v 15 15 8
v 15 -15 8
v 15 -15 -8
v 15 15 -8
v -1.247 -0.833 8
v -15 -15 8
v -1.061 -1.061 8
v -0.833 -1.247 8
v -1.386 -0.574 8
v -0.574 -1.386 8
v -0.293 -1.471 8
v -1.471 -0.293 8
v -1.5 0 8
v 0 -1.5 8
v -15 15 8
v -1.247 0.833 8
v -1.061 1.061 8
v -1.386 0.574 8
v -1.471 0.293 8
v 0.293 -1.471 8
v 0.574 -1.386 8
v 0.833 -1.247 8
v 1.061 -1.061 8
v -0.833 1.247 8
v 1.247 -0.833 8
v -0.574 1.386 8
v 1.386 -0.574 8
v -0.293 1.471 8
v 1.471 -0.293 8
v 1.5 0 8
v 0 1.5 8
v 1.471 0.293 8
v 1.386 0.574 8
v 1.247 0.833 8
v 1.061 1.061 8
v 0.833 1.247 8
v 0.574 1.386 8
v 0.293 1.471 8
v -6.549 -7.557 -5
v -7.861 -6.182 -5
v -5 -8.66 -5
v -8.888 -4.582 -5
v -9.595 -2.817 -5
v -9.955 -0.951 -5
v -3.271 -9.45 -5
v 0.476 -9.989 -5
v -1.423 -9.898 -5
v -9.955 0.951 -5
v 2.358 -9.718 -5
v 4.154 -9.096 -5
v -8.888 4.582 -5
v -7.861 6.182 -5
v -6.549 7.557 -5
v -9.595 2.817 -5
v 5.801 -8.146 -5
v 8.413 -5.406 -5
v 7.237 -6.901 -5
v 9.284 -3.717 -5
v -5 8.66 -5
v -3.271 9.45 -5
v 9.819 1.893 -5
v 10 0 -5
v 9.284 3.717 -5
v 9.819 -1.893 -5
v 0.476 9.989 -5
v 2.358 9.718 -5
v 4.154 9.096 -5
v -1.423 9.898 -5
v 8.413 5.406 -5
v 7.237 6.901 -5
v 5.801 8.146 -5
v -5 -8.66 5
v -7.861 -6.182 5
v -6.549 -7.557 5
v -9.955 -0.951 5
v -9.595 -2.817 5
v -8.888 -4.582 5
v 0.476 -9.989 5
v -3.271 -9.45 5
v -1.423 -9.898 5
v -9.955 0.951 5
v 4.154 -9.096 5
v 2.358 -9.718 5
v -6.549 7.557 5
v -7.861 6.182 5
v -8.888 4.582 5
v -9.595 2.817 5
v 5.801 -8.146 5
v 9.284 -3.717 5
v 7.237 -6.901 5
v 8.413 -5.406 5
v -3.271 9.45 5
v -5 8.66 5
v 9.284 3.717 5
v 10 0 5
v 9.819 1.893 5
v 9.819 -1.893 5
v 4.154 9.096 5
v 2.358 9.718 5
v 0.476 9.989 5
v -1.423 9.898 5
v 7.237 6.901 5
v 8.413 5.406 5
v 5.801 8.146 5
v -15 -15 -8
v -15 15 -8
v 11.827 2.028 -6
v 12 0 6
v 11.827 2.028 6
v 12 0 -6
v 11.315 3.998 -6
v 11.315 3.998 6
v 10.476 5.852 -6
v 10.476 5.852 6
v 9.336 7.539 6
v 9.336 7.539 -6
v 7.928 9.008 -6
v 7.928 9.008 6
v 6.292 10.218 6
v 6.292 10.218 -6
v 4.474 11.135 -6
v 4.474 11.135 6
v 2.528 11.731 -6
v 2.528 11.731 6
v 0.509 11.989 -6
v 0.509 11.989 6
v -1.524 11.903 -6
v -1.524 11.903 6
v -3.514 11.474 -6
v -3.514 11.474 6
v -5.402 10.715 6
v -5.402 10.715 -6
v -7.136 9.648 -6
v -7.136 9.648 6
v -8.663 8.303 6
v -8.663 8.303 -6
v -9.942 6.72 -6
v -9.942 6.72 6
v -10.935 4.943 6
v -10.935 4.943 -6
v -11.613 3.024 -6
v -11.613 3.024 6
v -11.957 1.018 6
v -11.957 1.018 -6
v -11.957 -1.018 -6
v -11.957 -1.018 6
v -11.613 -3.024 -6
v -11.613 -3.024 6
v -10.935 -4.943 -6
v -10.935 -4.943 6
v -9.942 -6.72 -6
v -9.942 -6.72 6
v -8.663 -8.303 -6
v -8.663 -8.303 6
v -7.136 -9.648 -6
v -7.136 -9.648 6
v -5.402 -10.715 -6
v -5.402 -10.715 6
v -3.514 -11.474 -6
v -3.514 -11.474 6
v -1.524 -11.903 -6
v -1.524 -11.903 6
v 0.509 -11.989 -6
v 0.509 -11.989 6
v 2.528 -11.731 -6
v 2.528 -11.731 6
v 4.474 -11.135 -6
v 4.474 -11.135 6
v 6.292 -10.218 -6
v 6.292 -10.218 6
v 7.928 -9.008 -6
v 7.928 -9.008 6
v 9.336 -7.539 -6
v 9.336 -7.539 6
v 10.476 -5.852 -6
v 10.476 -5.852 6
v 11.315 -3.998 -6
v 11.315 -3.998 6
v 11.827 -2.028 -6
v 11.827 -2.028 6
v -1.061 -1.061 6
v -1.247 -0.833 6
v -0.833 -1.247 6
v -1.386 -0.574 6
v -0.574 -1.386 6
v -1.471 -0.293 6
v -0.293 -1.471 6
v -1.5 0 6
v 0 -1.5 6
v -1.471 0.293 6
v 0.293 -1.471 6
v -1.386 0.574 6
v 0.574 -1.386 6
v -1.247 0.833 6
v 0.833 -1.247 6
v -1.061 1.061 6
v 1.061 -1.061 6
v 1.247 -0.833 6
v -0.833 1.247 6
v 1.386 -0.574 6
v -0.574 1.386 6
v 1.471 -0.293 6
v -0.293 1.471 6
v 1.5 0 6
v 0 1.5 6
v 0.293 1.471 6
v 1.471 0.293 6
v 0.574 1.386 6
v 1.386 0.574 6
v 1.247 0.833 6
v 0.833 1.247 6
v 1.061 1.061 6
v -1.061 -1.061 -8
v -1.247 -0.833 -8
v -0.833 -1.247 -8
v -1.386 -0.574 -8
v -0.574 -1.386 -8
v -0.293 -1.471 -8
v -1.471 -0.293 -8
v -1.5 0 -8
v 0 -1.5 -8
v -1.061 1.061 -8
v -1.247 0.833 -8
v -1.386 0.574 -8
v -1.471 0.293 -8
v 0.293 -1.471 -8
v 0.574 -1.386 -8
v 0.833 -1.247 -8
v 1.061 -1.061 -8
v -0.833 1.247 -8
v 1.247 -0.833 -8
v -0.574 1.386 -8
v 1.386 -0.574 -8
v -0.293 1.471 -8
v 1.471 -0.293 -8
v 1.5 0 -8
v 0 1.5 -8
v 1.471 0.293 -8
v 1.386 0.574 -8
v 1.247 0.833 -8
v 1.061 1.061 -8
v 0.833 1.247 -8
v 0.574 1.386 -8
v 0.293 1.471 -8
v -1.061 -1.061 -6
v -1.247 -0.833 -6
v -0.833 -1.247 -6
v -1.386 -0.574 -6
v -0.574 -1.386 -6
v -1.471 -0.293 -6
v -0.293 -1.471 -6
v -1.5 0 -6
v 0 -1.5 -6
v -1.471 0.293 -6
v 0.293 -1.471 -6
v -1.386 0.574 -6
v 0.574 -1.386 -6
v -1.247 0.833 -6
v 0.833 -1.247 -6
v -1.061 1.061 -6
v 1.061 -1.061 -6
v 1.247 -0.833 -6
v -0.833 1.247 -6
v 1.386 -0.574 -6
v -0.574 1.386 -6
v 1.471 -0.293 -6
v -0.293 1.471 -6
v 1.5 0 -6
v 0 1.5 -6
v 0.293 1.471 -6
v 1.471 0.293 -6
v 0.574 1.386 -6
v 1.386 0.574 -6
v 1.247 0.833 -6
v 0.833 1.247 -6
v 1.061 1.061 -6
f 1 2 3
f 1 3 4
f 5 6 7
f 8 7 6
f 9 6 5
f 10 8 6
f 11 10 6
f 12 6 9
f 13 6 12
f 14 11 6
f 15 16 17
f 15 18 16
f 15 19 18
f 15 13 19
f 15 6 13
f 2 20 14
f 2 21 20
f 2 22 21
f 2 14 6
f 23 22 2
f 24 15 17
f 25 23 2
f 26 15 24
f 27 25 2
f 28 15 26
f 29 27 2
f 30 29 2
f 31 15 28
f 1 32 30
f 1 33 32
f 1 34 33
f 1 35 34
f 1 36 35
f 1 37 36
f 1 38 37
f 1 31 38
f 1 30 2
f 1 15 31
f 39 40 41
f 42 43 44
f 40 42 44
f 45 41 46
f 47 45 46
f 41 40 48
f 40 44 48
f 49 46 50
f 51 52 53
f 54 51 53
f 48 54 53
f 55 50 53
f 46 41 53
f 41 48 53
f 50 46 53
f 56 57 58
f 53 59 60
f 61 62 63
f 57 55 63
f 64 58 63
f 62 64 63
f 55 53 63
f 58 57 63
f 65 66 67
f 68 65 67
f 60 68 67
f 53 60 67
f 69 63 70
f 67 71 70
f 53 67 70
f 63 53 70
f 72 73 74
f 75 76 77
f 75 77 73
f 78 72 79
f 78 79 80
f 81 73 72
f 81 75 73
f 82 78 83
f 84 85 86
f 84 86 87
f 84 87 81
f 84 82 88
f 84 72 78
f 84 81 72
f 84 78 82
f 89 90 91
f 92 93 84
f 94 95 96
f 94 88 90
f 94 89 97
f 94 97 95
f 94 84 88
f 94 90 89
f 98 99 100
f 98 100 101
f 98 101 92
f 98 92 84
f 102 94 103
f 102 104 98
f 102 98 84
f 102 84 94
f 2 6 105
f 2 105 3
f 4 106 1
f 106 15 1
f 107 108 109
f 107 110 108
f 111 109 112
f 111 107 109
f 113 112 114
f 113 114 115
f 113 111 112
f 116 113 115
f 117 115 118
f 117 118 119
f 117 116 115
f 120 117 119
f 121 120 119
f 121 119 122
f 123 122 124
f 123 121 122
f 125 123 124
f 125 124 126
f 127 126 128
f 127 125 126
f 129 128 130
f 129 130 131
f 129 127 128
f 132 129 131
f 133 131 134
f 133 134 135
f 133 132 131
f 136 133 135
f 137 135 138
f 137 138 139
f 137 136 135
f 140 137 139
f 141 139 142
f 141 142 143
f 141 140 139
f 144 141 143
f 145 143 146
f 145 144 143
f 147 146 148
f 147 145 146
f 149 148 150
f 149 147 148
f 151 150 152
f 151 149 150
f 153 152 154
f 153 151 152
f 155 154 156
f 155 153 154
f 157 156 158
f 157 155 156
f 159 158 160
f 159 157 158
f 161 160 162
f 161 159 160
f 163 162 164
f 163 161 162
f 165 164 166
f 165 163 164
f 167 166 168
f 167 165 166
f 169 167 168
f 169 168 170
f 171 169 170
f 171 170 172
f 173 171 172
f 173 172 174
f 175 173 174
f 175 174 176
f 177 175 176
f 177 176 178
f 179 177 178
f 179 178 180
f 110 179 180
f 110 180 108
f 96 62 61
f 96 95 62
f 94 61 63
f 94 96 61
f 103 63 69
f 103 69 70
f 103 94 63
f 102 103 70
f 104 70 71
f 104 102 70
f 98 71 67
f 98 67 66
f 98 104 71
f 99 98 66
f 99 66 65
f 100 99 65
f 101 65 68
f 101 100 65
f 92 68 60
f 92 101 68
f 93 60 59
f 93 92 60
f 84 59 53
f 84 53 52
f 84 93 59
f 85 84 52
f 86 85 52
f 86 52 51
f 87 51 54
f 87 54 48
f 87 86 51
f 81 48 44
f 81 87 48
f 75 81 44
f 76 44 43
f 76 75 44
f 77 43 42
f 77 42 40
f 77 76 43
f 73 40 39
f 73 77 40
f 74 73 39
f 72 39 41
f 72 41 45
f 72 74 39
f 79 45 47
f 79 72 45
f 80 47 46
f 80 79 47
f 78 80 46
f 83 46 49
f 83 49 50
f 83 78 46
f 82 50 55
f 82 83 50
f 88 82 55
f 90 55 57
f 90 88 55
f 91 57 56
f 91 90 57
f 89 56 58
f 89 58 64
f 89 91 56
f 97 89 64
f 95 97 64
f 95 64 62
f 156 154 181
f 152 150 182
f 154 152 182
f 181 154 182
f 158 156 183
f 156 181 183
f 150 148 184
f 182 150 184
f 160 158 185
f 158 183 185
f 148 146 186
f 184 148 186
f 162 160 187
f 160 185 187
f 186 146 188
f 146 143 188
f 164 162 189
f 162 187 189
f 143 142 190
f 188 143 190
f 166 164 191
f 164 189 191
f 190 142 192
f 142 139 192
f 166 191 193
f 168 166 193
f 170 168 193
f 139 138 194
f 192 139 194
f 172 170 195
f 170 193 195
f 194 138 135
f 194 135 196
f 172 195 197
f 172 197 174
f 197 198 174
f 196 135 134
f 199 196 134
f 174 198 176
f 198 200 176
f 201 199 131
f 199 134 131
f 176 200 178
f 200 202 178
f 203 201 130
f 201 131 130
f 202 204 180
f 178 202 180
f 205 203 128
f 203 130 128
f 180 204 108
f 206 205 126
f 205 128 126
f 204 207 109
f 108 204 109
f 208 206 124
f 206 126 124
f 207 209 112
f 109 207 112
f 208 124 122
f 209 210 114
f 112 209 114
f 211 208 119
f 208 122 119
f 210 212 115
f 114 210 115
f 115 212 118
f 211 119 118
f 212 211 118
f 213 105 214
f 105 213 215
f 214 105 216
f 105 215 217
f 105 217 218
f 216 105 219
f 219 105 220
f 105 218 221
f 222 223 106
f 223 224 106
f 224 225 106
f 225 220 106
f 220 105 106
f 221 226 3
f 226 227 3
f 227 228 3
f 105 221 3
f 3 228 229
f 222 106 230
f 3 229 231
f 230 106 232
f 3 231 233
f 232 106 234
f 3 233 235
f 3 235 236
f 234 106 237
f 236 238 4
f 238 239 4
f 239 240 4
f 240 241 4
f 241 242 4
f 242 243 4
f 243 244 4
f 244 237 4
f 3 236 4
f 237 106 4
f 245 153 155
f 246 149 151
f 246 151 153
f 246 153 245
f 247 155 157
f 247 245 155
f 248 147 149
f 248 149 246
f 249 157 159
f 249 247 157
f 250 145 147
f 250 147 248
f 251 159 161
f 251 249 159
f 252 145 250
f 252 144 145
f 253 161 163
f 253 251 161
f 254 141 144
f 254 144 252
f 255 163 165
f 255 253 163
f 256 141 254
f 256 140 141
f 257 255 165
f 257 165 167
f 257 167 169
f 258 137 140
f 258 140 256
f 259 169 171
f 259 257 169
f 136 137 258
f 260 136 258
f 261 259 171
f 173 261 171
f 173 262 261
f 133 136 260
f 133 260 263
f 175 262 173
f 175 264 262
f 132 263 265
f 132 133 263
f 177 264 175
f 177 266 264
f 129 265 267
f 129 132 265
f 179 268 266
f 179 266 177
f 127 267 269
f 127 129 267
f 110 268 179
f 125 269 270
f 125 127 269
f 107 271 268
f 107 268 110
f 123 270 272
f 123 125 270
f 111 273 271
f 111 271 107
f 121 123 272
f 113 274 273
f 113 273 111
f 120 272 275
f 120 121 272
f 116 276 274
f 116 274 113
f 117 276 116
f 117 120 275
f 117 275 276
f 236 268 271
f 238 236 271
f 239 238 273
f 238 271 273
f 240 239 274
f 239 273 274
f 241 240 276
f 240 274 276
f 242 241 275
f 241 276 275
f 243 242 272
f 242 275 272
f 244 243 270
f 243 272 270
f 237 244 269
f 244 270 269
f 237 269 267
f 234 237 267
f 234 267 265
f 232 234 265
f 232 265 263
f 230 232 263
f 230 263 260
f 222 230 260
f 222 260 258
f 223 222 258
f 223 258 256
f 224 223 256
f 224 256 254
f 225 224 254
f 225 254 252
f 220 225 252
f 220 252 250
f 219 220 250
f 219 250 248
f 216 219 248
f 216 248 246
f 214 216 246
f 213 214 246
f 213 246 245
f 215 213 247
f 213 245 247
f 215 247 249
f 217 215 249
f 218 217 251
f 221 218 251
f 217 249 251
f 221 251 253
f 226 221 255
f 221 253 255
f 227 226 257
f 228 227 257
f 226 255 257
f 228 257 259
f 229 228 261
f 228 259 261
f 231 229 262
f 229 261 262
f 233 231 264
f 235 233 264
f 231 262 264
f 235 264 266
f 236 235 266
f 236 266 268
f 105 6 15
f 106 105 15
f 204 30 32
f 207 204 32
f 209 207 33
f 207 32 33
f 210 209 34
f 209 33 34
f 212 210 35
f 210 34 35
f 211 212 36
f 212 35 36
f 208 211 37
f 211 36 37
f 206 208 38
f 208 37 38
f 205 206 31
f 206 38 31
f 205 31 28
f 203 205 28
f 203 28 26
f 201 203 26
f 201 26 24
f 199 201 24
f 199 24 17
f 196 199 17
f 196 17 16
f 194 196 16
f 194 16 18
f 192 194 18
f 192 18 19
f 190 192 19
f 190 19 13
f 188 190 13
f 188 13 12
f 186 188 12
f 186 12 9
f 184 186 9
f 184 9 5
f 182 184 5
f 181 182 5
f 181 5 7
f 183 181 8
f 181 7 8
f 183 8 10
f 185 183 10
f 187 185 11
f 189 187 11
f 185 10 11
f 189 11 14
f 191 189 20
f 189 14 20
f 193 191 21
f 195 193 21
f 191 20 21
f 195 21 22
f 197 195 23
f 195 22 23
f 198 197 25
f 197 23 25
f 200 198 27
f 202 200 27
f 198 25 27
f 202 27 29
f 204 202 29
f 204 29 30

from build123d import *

# Parameters (mm, degrees)
SKETCH1_R           = 10
BOSS_EXTRUDE1_DEPTH = 5
SKETCH2_W           = 30
SKETCH2_H           = 30
SKETCH2_R           = 12
BOSS_EXTRUDE2_DEPTH = 6
SKETCH3_W           = 30
SKETCH3_H           = 30
BOSS_EXTRUDE3_DEPTH = 2
SKETCH4_R           = 1.5
CUT_EXTRUDE1_DEPTH  = 27.570660511


with BuildPart() as part:
    # Sketch1 → Boss-Extrude1 (new, symmetric)
    with BuildSketch(Plane.XY):
        Circle(SKETCH1_R)
    extrude(amount=BOSS_EXTRUDE1_DEPTH, both=True)


with BuildPart() as body_2:
    # Sketch2 → Boss-Extrude2 (new, symmetric)
    with BuildSketch(Plane.XY):
        Rectangle(SKETCH2_W, SKETCH2_H)
        Circle(SKETCH2_R, mode=Mode.SUBTRACT)
    extrude(amount=BOSS_EXTRUDE2_DEPTH, both=True)

    # Sketch3 → Boss-Extrude3 (add)
    with BuildSketch(Plane.XY.offset(6)):
        Rectangle(SKETCH3_W, SKETCH3_H)
    boss_extrude3 = extrude(amount=BOSS_EXTRUDE3_DEPTH)

    # Mirror1: Boss-Extrude3 across plane
    add(boss_extrude3.mirror(Plane.XY))

    # Sketch4 → Cut-Extrude1 (cut, through all)
    with BuildSketch(Plane.XY.offset(8)):
        Circle(SKETCH4_R)
    extrude(amount=-CUT_EXTRUDE1_DEPTH, mode=Mode.SUBTRACT)


solid = Compound([part.part, body_2.part])
